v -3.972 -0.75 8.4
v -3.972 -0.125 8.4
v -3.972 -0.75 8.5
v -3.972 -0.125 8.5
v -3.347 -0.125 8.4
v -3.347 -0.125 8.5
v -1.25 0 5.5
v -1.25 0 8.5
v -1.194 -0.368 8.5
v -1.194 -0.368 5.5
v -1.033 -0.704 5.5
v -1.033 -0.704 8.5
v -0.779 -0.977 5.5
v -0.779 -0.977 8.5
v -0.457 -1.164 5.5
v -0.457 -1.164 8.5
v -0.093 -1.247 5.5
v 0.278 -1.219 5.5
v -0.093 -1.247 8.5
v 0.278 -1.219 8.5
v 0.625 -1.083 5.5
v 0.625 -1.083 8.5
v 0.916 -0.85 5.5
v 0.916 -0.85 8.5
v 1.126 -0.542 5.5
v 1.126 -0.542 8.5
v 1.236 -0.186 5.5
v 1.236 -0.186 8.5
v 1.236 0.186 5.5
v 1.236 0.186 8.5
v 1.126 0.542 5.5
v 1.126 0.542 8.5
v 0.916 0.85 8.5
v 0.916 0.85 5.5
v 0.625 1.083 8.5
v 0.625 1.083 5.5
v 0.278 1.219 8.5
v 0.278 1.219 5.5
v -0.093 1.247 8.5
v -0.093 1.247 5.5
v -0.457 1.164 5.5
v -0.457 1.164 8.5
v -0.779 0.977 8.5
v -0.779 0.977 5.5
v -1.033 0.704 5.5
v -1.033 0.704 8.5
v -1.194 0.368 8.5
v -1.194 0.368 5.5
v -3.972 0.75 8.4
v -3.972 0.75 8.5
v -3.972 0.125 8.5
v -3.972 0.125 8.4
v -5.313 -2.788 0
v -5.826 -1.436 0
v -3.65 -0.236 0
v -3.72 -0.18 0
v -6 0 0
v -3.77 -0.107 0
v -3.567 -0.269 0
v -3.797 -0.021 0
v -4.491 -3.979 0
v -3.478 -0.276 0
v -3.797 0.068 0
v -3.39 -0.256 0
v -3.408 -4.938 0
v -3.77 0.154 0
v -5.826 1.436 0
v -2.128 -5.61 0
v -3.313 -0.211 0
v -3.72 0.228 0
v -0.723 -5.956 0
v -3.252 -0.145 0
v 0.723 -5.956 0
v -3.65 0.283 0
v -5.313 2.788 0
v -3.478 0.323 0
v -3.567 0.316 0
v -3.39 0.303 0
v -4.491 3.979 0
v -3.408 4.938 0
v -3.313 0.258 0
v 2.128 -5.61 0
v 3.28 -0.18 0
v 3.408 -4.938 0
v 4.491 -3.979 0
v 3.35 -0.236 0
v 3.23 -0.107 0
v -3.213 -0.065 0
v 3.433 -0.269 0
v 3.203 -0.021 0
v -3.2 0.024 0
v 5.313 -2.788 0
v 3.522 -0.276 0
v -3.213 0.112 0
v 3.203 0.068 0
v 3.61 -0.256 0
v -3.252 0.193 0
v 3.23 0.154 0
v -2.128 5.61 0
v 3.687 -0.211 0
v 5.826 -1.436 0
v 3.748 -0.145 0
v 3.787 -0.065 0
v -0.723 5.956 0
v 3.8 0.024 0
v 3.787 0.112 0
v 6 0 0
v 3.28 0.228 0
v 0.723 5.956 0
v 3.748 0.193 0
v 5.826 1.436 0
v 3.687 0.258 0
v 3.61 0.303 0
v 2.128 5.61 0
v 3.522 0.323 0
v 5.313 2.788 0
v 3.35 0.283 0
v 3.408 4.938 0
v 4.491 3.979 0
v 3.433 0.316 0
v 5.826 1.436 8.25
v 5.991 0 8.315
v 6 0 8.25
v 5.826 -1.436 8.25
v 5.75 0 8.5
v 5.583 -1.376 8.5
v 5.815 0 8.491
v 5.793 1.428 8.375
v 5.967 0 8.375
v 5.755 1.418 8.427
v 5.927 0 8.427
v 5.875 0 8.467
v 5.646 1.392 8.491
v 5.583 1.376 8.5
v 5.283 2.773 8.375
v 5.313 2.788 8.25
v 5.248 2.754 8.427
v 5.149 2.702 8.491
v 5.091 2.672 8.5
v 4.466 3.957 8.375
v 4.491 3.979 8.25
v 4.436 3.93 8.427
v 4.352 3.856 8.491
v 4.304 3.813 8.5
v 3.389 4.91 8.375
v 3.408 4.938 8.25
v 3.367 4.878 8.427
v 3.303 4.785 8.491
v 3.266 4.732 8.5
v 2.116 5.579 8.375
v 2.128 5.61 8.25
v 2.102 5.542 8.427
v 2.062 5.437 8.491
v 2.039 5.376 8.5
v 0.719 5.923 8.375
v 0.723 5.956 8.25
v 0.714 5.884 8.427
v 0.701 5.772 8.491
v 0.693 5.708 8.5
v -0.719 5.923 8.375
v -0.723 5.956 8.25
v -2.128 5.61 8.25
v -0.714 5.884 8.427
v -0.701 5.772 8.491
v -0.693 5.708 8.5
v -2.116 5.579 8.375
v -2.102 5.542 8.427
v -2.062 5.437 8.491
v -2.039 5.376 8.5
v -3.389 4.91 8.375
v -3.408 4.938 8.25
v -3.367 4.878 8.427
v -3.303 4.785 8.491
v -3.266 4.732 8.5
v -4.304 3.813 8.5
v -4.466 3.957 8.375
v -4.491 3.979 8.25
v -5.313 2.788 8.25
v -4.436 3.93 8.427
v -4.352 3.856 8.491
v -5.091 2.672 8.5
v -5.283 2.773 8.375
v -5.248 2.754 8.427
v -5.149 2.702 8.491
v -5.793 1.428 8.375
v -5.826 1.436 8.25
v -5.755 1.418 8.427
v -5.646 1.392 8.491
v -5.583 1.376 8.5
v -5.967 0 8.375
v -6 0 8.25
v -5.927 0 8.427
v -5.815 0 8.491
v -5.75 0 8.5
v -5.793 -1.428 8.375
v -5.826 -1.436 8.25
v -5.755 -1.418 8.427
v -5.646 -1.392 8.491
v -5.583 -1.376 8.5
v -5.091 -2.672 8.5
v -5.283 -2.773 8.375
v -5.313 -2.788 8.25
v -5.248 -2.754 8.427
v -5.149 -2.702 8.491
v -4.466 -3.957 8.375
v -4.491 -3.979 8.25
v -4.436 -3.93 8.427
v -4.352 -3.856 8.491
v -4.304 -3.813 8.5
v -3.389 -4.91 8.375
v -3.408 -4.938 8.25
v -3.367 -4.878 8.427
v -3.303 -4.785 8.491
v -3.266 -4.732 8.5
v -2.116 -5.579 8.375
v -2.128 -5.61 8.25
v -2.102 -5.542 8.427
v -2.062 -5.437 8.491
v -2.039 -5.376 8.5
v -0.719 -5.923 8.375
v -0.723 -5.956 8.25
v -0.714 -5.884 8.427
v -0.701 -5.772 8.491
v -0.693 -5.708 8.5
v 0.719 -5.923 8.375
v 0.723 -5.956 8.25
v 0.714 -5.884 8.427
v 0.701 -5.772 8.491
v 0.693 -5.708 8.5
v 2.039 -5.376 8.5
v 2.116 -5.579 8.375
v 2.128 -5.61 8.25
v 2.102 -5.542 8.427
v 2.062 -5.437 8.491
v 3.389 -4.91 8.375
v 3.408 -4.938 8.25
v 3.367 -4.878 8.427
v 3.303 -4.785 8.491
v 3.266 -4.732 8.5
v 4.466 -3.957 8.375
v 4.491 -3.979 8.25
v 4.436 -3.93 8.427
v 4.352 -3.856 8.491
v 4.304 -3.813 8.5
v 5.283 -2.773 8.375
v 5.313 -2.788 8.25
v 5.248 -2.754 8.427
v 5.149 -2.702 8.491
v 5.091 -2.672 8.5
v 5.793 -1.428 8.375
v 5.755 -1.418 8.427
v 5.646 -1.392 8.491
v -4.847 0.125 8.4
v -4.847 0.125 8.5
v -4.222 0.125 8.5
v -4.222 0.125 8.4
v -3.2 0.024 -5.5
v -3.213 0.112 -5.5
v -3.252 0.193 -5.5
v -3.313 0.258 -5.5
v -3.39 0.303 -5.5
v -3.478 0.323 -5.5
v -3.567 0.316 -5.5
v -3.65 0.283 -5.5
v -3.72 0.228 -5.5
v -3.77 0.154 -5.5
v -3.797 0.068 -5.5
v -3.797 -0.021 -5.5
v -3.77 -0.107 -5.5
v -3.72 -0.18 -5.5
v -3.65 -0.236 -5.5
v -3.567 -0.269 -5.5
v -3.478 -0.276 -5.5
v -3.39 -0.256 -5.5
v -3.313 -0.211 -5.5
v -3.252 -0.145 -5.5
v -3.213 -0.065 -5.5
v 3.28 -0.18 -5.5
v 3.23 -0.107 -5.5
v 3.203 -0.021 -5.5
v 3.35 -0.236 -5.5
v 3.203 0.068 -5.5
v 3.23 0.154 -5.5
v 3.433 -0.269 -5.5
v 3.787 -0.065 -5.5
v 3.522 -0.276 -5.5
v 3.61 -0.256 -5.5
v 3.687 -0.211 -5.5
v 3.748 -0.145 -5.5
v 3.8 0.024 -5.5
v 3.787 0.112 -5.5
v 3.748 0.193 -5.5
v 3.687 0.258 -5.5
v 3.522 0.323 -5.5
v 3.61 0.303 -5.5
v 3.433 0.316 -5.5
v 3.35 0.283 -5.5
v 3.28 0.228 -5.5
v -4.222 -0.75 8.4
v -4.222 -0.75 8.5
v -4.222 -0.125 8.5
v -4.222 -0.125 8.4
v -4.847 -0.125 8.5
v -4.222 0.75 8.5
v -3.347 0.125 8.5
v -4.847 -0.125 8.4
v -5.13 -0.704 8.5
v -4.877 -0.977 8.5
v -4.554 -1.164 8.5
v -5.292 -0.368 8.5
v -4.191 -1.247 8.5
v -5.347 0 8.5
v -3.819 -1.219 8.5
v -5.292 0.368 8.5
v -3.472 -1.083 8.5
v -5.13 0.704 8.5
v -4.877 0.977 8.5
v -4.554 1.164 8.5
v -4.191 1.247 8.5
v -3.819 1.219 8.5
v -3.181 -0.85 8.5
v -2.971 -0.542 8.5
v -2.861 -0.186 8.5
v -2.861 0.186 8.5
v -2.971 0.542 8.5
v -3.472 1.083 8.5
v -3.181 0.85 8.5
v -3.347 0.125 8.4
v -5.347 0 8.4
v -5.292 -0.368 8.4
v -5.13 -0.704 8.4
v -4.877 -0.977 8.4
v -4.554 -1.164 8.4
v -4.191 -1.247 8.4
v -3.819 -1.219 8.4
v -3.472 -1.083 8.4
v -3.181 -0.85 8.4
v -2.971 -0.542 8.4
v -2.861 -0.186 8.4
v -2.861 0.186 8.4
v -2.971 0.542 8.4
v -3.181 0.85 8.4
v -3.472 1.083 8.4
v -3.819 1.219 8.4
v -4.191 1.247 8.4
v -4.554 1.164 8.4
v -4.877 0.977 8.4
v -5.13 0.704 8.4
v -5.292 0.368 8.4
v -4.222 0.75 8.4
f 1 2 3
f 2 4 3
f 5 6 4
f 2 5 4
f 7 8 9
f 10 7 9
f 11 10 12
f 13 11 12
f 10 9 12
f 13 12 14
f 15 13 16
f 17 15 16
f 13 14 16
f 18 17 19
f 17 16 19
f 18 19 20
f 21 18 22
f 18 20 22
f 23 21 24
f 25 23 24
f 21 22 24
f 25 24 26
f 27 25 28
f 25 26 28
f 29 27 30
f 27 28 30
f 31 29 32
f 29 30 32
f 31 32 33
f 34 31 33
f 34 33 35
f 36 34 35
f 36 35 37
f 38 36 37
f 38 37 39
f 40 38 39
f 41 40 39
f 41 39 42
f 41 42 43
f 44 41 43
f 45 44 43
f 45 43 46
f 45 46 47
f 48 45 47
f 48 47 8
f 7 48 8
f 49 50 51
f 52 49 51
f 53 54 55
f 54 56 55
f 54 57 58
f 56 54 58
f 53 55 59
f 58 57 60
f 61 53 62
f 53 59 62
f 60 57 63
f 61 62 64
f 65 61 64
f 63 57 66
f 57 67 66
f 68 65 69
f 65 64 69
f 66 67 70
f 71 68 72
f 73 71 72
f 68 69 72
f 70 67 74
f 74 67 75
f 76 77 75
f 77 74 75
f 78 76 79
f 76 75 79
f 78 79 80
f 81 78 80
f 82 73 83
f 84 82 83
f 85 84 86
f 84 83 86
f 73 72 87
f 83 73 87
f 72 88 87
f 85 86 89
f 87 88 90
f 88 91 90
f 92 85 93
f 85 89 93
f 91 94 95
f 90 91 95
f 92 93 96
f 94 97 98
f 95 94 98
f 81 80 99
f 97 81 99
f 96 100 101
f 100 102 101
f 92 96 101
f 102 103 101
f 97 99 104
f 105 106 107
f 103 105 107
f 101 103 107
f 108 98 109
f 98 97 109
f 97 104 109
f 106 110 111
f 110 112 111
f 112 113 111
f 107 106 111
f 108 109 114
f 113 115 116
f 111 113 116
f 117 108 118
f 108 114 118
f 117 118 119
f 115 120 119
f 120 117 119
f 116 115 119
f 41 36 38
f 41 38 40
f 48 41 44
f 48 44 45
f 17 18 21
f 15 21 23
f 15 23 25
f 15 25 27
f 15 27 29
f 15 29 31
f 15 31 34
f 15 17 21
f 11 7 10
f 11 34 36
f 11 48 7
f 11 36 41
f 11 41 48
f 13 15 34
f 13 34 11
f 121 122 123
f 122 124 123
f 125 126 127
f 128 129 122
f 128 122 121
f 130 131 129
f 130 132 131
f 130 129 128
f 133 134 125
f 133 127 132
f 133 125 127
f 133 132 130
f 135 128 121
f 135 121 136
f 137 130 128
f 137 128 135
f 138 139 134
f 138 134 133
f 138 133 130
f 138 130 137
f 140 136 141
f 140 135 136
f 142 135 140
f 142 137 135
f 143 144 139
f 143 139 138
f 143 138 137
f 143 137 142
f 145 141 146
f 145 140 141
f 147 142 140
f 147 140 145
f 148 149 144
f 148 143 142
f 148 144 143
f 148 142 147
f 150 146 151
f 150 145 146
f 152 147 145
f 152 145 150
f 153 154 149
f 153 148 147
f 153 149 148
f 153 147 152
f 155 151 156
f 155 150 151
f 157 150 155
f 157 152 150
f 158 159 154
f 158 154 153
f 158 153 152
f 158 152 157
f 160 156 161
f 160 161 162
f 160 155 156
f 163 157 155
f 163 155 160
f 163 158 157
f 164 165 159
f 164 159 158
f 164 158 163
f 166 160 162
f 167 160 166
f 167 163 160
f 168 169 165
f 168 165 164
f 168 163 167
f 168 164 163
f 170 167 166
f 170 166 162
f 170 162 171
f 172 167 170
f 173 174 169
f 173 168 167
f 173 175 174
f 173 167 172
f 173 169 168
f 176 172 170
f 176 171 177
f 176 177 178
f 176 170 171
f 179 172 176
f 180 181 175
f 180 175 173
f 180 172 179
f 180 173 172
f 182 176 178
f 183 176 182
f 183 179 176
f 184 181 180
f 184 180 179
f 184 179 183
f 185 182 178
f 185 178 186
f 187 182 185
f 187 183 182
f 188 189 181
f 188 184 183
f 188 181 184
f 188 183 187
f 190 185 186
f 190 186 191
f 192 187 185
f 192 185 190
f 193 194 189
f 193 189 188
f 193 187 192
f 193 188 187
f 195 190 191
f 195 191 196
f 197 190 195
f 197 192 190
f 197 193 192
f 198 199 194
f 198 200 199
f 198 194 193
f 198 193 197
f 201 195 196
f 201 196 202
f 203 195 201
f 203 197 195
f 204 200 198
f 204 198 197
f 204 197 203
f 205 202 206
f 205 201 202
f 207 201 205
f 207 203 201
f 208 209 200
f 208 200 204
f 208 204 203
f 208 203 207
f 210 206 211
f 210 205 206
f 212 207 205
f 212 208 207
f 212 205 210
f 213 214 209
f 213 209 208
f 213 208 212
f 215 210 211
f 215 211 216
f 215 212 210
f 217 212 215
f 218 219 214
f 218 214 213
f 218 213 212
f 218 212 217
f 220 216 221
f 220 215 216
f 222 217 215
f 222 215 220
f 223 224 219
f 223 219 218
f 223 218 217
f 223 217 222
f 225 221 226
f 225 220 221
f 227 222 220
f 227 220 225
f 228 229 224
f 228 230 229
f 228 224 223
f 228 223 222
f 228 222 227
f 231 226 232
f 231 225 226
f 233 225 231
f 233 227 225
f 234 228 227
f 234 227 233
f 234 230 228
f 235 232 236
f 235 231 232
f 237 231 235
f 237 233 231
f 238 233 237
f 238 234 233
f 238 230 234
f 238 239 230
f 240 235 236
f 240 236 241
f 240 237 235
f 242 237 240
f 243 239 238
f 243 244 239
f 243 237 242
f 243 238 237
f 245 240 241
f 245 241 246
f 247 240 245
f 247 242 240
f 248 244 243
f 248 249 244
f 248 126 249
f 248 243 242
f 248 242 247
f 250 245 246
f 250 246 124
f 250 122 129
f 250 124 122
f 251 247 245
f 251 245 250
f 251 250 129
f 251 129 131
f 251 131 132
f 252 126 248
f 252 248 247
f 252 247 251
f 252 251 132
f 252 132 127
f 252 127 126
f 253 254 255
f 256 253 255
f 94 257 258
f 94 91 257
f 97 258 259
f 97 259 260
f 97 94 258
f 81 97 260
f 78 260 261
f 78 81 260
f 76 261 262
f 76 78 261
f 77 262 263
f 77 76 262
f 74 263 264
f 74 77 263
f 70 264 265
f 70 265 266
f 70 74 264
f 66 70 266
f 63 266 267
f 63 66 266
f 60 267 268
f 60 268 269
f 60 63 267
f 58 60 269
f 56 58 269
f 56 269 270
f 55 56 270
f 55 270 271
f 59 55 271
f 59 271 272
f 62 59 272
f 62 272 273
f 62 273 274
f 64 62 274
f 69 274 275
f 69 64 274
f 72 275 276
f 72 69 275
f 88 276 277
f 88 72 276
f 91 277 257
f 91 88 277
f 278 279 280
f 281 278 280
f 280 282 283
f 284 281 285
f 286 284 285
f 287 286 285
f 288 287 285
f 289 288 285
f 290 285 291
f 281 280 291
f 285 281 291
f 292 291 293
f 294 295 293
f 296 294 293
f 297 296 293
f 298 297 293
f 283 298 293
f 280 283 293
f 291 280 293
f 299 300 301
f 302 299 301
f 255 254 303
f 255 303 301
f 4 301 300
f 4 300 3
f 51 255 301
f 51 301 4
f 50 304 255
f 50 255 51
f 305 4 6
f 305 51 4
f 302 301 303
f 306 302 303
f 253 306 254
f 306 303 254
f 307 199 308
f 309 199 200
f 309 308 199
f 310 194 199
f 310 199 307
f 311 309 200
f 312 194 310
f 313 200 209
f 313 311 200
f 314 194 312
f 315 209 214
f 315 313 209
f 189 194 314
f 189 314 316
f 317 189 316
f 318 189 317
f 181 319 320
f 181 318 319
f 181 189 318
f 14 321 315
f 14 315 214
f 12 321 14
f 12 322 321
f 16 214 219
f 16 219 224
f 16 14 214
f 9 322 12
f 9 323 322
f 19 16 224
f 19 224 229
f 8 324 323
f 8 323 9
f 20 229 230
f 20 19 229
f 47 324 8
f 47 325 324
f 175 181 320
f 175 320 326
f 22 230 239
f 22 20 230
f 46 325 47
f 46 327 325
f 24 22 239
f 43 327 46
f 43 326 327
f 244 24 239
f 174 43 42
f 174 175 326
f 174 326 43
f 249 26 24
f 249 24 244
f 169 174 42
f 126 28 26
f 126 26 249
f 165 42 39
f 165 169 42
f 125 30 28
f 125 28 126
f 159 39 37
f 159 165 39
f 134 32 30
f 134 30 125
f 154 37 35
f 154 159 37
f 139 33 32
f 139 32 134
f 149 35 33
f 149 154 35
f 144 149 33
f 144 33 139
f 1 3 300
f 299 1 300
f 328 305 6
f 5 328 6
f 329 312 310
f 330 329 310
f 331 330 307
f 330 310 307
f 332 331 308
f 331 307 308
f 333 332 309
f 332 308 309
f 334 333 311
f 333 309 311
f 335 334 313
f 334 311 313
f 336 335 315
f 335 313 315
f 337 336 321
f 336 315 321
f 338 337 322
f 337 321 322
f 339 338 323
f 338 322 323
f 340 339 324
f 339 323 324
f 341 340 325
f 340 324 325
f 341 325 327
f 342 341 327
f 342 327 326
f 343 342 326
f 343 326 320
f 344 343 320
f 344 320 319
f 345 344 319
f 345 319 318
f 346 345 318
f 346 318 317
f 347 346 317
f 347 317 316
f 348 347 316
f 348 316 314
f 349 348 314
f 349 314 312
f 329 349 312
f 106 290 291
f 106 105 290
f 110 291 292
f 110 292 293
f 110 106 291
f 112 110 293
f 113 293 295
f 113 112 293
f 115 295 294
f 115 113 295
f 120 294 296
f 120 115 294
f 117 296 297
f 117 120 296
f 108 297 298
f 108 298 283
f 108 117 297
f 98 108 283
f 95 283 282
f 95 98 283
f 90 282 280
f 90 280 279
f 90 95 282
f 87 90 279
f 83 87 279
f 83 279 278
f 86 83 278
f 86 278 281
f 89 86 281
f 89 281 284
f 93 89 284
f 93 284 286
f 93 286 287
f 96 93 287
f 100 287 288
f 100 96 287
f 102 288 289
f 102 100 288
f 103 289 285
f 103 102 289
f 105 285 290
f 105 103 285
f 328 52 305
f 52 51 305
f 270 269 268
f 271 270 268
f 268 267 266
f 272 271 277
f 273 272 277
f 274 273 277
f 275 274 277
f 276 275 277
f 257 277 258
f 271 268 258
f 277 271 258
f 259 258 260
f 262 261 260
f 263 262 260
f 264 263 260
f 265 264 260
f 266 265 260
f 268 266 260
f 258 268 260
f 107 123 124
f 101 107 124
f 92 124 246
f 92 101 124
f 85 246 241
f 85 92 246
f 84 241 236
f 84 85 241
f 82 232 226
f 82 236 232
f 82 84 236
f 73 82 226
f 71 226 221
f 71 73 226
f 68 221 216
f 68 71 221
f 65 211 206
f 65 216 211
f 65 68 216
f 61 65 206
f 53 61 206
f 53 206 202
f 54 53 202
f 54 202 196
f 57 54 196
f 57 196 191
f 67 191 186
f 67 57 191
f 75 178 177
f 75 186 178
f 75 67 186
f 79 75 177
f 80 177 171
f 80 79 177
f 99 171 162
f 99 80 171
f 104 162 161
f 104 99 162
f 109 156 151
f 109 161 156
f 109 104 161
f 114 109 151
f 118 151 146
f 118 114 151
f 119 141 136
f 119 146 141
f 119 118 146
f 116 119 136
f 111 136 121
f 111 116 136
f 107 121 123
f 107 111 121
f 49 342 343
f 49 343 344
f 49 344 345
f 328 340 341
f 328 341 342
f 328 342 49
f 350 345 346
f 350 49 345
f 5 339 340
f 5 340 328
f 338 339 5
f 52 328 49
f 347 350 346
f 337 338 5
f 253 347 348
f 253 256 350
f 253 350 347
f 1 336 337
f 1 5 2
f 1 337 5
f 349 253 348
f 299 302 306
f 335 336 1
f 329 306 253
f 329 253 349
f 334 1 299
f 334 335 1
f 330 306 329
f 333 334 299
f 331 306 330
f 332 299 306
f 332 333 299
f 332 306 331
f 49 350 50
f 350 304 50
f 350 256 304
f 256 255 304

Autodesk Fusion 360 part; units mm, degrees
sketch "Sketch1" plane through (0, 0, 0) normal (0, 0, 1) x (1, 0, 0)
  circle A0 centre (0, 0) radius 6
  circle A1 centre (0, 0) radius 1.25
  line L0 (-6, 0.0236) -> (6, 0.0236) construction
  line L1 (-6, 0.0236) -> (-3.5, 0.0236) construction
  line L2 (6, 0.0236) -> (3.5, 0.0236) construction
  circle A2 centre (3.5, 0.0236) radius 0.3
  circle A3 centre (-3.5, 0.0236) radius 0.3
  dimension "d1" = 12
  dimension "d2" = 2.5
  dimension "d3" = 2.5
  dimension "d5" = 2.5
  dimension "d6" = 0.6
  dimension "d7" = 0.6
extrude "Extrude1" add sketch "Sketch1" along normal blind 8.5 contours A0 | A1 | A2 | A3
sketch "Sketch2" plane through (0, 0, 8.5) normal (0, 0, 1) x (-1, 0, 0)
  circle A0 centre (0, 0) radius 6
  circle A1 centre (0, 0) radius 1.25
  circle A2 centre (4.0974, 0) radius 1.25
  line L0 (3.9724, 0.75) -> (4.2224, 0.75)
  line L1 (4.2224, 0.75) -> (4.2224, -0.75)
  line L2 (4.2224, -0.75) -> (3.9724, -0.75)
  line L3 (3.9724, -0.75) -> (3.9724, 0.75)
  line L4 (3.9724, 0.75) -> (4.2224, -0.75) construction
  line L5 (4.2224, 0.75) -> (3.9724, -0.75) construction
  line L6 (4.8474, -0.125) -> (3.3474, -0.125)
  line L7 (4.8474, 0.125) -> (4.8474, -0.125)
  line L8 (3.3474, 0.125) -> (4.8474, 0.125)
  line L9 (3.3474, -0.125) -> (3.3474, 0.125)
  point P0 (4.0974, 0)
  dimension "d14" = 2.5
  dimension "d15" = 1.5
  dimension "d16" = 0.25
  dimension "d18" = 90
extrude "Extrude4" cut sketch "Sketch2" against normal blind 0.1 contours A2
extrude "Extrude2" cut sketch "Sketch2" against normal blind 3 contours A1
extrude "Extrude3" add sketch "Sketch1" against normal blind 5.5 contours A2 | A3
fillet "Fillet1" radius 0.25 1 edges at (-5.594, -2.1697, 8.5)
